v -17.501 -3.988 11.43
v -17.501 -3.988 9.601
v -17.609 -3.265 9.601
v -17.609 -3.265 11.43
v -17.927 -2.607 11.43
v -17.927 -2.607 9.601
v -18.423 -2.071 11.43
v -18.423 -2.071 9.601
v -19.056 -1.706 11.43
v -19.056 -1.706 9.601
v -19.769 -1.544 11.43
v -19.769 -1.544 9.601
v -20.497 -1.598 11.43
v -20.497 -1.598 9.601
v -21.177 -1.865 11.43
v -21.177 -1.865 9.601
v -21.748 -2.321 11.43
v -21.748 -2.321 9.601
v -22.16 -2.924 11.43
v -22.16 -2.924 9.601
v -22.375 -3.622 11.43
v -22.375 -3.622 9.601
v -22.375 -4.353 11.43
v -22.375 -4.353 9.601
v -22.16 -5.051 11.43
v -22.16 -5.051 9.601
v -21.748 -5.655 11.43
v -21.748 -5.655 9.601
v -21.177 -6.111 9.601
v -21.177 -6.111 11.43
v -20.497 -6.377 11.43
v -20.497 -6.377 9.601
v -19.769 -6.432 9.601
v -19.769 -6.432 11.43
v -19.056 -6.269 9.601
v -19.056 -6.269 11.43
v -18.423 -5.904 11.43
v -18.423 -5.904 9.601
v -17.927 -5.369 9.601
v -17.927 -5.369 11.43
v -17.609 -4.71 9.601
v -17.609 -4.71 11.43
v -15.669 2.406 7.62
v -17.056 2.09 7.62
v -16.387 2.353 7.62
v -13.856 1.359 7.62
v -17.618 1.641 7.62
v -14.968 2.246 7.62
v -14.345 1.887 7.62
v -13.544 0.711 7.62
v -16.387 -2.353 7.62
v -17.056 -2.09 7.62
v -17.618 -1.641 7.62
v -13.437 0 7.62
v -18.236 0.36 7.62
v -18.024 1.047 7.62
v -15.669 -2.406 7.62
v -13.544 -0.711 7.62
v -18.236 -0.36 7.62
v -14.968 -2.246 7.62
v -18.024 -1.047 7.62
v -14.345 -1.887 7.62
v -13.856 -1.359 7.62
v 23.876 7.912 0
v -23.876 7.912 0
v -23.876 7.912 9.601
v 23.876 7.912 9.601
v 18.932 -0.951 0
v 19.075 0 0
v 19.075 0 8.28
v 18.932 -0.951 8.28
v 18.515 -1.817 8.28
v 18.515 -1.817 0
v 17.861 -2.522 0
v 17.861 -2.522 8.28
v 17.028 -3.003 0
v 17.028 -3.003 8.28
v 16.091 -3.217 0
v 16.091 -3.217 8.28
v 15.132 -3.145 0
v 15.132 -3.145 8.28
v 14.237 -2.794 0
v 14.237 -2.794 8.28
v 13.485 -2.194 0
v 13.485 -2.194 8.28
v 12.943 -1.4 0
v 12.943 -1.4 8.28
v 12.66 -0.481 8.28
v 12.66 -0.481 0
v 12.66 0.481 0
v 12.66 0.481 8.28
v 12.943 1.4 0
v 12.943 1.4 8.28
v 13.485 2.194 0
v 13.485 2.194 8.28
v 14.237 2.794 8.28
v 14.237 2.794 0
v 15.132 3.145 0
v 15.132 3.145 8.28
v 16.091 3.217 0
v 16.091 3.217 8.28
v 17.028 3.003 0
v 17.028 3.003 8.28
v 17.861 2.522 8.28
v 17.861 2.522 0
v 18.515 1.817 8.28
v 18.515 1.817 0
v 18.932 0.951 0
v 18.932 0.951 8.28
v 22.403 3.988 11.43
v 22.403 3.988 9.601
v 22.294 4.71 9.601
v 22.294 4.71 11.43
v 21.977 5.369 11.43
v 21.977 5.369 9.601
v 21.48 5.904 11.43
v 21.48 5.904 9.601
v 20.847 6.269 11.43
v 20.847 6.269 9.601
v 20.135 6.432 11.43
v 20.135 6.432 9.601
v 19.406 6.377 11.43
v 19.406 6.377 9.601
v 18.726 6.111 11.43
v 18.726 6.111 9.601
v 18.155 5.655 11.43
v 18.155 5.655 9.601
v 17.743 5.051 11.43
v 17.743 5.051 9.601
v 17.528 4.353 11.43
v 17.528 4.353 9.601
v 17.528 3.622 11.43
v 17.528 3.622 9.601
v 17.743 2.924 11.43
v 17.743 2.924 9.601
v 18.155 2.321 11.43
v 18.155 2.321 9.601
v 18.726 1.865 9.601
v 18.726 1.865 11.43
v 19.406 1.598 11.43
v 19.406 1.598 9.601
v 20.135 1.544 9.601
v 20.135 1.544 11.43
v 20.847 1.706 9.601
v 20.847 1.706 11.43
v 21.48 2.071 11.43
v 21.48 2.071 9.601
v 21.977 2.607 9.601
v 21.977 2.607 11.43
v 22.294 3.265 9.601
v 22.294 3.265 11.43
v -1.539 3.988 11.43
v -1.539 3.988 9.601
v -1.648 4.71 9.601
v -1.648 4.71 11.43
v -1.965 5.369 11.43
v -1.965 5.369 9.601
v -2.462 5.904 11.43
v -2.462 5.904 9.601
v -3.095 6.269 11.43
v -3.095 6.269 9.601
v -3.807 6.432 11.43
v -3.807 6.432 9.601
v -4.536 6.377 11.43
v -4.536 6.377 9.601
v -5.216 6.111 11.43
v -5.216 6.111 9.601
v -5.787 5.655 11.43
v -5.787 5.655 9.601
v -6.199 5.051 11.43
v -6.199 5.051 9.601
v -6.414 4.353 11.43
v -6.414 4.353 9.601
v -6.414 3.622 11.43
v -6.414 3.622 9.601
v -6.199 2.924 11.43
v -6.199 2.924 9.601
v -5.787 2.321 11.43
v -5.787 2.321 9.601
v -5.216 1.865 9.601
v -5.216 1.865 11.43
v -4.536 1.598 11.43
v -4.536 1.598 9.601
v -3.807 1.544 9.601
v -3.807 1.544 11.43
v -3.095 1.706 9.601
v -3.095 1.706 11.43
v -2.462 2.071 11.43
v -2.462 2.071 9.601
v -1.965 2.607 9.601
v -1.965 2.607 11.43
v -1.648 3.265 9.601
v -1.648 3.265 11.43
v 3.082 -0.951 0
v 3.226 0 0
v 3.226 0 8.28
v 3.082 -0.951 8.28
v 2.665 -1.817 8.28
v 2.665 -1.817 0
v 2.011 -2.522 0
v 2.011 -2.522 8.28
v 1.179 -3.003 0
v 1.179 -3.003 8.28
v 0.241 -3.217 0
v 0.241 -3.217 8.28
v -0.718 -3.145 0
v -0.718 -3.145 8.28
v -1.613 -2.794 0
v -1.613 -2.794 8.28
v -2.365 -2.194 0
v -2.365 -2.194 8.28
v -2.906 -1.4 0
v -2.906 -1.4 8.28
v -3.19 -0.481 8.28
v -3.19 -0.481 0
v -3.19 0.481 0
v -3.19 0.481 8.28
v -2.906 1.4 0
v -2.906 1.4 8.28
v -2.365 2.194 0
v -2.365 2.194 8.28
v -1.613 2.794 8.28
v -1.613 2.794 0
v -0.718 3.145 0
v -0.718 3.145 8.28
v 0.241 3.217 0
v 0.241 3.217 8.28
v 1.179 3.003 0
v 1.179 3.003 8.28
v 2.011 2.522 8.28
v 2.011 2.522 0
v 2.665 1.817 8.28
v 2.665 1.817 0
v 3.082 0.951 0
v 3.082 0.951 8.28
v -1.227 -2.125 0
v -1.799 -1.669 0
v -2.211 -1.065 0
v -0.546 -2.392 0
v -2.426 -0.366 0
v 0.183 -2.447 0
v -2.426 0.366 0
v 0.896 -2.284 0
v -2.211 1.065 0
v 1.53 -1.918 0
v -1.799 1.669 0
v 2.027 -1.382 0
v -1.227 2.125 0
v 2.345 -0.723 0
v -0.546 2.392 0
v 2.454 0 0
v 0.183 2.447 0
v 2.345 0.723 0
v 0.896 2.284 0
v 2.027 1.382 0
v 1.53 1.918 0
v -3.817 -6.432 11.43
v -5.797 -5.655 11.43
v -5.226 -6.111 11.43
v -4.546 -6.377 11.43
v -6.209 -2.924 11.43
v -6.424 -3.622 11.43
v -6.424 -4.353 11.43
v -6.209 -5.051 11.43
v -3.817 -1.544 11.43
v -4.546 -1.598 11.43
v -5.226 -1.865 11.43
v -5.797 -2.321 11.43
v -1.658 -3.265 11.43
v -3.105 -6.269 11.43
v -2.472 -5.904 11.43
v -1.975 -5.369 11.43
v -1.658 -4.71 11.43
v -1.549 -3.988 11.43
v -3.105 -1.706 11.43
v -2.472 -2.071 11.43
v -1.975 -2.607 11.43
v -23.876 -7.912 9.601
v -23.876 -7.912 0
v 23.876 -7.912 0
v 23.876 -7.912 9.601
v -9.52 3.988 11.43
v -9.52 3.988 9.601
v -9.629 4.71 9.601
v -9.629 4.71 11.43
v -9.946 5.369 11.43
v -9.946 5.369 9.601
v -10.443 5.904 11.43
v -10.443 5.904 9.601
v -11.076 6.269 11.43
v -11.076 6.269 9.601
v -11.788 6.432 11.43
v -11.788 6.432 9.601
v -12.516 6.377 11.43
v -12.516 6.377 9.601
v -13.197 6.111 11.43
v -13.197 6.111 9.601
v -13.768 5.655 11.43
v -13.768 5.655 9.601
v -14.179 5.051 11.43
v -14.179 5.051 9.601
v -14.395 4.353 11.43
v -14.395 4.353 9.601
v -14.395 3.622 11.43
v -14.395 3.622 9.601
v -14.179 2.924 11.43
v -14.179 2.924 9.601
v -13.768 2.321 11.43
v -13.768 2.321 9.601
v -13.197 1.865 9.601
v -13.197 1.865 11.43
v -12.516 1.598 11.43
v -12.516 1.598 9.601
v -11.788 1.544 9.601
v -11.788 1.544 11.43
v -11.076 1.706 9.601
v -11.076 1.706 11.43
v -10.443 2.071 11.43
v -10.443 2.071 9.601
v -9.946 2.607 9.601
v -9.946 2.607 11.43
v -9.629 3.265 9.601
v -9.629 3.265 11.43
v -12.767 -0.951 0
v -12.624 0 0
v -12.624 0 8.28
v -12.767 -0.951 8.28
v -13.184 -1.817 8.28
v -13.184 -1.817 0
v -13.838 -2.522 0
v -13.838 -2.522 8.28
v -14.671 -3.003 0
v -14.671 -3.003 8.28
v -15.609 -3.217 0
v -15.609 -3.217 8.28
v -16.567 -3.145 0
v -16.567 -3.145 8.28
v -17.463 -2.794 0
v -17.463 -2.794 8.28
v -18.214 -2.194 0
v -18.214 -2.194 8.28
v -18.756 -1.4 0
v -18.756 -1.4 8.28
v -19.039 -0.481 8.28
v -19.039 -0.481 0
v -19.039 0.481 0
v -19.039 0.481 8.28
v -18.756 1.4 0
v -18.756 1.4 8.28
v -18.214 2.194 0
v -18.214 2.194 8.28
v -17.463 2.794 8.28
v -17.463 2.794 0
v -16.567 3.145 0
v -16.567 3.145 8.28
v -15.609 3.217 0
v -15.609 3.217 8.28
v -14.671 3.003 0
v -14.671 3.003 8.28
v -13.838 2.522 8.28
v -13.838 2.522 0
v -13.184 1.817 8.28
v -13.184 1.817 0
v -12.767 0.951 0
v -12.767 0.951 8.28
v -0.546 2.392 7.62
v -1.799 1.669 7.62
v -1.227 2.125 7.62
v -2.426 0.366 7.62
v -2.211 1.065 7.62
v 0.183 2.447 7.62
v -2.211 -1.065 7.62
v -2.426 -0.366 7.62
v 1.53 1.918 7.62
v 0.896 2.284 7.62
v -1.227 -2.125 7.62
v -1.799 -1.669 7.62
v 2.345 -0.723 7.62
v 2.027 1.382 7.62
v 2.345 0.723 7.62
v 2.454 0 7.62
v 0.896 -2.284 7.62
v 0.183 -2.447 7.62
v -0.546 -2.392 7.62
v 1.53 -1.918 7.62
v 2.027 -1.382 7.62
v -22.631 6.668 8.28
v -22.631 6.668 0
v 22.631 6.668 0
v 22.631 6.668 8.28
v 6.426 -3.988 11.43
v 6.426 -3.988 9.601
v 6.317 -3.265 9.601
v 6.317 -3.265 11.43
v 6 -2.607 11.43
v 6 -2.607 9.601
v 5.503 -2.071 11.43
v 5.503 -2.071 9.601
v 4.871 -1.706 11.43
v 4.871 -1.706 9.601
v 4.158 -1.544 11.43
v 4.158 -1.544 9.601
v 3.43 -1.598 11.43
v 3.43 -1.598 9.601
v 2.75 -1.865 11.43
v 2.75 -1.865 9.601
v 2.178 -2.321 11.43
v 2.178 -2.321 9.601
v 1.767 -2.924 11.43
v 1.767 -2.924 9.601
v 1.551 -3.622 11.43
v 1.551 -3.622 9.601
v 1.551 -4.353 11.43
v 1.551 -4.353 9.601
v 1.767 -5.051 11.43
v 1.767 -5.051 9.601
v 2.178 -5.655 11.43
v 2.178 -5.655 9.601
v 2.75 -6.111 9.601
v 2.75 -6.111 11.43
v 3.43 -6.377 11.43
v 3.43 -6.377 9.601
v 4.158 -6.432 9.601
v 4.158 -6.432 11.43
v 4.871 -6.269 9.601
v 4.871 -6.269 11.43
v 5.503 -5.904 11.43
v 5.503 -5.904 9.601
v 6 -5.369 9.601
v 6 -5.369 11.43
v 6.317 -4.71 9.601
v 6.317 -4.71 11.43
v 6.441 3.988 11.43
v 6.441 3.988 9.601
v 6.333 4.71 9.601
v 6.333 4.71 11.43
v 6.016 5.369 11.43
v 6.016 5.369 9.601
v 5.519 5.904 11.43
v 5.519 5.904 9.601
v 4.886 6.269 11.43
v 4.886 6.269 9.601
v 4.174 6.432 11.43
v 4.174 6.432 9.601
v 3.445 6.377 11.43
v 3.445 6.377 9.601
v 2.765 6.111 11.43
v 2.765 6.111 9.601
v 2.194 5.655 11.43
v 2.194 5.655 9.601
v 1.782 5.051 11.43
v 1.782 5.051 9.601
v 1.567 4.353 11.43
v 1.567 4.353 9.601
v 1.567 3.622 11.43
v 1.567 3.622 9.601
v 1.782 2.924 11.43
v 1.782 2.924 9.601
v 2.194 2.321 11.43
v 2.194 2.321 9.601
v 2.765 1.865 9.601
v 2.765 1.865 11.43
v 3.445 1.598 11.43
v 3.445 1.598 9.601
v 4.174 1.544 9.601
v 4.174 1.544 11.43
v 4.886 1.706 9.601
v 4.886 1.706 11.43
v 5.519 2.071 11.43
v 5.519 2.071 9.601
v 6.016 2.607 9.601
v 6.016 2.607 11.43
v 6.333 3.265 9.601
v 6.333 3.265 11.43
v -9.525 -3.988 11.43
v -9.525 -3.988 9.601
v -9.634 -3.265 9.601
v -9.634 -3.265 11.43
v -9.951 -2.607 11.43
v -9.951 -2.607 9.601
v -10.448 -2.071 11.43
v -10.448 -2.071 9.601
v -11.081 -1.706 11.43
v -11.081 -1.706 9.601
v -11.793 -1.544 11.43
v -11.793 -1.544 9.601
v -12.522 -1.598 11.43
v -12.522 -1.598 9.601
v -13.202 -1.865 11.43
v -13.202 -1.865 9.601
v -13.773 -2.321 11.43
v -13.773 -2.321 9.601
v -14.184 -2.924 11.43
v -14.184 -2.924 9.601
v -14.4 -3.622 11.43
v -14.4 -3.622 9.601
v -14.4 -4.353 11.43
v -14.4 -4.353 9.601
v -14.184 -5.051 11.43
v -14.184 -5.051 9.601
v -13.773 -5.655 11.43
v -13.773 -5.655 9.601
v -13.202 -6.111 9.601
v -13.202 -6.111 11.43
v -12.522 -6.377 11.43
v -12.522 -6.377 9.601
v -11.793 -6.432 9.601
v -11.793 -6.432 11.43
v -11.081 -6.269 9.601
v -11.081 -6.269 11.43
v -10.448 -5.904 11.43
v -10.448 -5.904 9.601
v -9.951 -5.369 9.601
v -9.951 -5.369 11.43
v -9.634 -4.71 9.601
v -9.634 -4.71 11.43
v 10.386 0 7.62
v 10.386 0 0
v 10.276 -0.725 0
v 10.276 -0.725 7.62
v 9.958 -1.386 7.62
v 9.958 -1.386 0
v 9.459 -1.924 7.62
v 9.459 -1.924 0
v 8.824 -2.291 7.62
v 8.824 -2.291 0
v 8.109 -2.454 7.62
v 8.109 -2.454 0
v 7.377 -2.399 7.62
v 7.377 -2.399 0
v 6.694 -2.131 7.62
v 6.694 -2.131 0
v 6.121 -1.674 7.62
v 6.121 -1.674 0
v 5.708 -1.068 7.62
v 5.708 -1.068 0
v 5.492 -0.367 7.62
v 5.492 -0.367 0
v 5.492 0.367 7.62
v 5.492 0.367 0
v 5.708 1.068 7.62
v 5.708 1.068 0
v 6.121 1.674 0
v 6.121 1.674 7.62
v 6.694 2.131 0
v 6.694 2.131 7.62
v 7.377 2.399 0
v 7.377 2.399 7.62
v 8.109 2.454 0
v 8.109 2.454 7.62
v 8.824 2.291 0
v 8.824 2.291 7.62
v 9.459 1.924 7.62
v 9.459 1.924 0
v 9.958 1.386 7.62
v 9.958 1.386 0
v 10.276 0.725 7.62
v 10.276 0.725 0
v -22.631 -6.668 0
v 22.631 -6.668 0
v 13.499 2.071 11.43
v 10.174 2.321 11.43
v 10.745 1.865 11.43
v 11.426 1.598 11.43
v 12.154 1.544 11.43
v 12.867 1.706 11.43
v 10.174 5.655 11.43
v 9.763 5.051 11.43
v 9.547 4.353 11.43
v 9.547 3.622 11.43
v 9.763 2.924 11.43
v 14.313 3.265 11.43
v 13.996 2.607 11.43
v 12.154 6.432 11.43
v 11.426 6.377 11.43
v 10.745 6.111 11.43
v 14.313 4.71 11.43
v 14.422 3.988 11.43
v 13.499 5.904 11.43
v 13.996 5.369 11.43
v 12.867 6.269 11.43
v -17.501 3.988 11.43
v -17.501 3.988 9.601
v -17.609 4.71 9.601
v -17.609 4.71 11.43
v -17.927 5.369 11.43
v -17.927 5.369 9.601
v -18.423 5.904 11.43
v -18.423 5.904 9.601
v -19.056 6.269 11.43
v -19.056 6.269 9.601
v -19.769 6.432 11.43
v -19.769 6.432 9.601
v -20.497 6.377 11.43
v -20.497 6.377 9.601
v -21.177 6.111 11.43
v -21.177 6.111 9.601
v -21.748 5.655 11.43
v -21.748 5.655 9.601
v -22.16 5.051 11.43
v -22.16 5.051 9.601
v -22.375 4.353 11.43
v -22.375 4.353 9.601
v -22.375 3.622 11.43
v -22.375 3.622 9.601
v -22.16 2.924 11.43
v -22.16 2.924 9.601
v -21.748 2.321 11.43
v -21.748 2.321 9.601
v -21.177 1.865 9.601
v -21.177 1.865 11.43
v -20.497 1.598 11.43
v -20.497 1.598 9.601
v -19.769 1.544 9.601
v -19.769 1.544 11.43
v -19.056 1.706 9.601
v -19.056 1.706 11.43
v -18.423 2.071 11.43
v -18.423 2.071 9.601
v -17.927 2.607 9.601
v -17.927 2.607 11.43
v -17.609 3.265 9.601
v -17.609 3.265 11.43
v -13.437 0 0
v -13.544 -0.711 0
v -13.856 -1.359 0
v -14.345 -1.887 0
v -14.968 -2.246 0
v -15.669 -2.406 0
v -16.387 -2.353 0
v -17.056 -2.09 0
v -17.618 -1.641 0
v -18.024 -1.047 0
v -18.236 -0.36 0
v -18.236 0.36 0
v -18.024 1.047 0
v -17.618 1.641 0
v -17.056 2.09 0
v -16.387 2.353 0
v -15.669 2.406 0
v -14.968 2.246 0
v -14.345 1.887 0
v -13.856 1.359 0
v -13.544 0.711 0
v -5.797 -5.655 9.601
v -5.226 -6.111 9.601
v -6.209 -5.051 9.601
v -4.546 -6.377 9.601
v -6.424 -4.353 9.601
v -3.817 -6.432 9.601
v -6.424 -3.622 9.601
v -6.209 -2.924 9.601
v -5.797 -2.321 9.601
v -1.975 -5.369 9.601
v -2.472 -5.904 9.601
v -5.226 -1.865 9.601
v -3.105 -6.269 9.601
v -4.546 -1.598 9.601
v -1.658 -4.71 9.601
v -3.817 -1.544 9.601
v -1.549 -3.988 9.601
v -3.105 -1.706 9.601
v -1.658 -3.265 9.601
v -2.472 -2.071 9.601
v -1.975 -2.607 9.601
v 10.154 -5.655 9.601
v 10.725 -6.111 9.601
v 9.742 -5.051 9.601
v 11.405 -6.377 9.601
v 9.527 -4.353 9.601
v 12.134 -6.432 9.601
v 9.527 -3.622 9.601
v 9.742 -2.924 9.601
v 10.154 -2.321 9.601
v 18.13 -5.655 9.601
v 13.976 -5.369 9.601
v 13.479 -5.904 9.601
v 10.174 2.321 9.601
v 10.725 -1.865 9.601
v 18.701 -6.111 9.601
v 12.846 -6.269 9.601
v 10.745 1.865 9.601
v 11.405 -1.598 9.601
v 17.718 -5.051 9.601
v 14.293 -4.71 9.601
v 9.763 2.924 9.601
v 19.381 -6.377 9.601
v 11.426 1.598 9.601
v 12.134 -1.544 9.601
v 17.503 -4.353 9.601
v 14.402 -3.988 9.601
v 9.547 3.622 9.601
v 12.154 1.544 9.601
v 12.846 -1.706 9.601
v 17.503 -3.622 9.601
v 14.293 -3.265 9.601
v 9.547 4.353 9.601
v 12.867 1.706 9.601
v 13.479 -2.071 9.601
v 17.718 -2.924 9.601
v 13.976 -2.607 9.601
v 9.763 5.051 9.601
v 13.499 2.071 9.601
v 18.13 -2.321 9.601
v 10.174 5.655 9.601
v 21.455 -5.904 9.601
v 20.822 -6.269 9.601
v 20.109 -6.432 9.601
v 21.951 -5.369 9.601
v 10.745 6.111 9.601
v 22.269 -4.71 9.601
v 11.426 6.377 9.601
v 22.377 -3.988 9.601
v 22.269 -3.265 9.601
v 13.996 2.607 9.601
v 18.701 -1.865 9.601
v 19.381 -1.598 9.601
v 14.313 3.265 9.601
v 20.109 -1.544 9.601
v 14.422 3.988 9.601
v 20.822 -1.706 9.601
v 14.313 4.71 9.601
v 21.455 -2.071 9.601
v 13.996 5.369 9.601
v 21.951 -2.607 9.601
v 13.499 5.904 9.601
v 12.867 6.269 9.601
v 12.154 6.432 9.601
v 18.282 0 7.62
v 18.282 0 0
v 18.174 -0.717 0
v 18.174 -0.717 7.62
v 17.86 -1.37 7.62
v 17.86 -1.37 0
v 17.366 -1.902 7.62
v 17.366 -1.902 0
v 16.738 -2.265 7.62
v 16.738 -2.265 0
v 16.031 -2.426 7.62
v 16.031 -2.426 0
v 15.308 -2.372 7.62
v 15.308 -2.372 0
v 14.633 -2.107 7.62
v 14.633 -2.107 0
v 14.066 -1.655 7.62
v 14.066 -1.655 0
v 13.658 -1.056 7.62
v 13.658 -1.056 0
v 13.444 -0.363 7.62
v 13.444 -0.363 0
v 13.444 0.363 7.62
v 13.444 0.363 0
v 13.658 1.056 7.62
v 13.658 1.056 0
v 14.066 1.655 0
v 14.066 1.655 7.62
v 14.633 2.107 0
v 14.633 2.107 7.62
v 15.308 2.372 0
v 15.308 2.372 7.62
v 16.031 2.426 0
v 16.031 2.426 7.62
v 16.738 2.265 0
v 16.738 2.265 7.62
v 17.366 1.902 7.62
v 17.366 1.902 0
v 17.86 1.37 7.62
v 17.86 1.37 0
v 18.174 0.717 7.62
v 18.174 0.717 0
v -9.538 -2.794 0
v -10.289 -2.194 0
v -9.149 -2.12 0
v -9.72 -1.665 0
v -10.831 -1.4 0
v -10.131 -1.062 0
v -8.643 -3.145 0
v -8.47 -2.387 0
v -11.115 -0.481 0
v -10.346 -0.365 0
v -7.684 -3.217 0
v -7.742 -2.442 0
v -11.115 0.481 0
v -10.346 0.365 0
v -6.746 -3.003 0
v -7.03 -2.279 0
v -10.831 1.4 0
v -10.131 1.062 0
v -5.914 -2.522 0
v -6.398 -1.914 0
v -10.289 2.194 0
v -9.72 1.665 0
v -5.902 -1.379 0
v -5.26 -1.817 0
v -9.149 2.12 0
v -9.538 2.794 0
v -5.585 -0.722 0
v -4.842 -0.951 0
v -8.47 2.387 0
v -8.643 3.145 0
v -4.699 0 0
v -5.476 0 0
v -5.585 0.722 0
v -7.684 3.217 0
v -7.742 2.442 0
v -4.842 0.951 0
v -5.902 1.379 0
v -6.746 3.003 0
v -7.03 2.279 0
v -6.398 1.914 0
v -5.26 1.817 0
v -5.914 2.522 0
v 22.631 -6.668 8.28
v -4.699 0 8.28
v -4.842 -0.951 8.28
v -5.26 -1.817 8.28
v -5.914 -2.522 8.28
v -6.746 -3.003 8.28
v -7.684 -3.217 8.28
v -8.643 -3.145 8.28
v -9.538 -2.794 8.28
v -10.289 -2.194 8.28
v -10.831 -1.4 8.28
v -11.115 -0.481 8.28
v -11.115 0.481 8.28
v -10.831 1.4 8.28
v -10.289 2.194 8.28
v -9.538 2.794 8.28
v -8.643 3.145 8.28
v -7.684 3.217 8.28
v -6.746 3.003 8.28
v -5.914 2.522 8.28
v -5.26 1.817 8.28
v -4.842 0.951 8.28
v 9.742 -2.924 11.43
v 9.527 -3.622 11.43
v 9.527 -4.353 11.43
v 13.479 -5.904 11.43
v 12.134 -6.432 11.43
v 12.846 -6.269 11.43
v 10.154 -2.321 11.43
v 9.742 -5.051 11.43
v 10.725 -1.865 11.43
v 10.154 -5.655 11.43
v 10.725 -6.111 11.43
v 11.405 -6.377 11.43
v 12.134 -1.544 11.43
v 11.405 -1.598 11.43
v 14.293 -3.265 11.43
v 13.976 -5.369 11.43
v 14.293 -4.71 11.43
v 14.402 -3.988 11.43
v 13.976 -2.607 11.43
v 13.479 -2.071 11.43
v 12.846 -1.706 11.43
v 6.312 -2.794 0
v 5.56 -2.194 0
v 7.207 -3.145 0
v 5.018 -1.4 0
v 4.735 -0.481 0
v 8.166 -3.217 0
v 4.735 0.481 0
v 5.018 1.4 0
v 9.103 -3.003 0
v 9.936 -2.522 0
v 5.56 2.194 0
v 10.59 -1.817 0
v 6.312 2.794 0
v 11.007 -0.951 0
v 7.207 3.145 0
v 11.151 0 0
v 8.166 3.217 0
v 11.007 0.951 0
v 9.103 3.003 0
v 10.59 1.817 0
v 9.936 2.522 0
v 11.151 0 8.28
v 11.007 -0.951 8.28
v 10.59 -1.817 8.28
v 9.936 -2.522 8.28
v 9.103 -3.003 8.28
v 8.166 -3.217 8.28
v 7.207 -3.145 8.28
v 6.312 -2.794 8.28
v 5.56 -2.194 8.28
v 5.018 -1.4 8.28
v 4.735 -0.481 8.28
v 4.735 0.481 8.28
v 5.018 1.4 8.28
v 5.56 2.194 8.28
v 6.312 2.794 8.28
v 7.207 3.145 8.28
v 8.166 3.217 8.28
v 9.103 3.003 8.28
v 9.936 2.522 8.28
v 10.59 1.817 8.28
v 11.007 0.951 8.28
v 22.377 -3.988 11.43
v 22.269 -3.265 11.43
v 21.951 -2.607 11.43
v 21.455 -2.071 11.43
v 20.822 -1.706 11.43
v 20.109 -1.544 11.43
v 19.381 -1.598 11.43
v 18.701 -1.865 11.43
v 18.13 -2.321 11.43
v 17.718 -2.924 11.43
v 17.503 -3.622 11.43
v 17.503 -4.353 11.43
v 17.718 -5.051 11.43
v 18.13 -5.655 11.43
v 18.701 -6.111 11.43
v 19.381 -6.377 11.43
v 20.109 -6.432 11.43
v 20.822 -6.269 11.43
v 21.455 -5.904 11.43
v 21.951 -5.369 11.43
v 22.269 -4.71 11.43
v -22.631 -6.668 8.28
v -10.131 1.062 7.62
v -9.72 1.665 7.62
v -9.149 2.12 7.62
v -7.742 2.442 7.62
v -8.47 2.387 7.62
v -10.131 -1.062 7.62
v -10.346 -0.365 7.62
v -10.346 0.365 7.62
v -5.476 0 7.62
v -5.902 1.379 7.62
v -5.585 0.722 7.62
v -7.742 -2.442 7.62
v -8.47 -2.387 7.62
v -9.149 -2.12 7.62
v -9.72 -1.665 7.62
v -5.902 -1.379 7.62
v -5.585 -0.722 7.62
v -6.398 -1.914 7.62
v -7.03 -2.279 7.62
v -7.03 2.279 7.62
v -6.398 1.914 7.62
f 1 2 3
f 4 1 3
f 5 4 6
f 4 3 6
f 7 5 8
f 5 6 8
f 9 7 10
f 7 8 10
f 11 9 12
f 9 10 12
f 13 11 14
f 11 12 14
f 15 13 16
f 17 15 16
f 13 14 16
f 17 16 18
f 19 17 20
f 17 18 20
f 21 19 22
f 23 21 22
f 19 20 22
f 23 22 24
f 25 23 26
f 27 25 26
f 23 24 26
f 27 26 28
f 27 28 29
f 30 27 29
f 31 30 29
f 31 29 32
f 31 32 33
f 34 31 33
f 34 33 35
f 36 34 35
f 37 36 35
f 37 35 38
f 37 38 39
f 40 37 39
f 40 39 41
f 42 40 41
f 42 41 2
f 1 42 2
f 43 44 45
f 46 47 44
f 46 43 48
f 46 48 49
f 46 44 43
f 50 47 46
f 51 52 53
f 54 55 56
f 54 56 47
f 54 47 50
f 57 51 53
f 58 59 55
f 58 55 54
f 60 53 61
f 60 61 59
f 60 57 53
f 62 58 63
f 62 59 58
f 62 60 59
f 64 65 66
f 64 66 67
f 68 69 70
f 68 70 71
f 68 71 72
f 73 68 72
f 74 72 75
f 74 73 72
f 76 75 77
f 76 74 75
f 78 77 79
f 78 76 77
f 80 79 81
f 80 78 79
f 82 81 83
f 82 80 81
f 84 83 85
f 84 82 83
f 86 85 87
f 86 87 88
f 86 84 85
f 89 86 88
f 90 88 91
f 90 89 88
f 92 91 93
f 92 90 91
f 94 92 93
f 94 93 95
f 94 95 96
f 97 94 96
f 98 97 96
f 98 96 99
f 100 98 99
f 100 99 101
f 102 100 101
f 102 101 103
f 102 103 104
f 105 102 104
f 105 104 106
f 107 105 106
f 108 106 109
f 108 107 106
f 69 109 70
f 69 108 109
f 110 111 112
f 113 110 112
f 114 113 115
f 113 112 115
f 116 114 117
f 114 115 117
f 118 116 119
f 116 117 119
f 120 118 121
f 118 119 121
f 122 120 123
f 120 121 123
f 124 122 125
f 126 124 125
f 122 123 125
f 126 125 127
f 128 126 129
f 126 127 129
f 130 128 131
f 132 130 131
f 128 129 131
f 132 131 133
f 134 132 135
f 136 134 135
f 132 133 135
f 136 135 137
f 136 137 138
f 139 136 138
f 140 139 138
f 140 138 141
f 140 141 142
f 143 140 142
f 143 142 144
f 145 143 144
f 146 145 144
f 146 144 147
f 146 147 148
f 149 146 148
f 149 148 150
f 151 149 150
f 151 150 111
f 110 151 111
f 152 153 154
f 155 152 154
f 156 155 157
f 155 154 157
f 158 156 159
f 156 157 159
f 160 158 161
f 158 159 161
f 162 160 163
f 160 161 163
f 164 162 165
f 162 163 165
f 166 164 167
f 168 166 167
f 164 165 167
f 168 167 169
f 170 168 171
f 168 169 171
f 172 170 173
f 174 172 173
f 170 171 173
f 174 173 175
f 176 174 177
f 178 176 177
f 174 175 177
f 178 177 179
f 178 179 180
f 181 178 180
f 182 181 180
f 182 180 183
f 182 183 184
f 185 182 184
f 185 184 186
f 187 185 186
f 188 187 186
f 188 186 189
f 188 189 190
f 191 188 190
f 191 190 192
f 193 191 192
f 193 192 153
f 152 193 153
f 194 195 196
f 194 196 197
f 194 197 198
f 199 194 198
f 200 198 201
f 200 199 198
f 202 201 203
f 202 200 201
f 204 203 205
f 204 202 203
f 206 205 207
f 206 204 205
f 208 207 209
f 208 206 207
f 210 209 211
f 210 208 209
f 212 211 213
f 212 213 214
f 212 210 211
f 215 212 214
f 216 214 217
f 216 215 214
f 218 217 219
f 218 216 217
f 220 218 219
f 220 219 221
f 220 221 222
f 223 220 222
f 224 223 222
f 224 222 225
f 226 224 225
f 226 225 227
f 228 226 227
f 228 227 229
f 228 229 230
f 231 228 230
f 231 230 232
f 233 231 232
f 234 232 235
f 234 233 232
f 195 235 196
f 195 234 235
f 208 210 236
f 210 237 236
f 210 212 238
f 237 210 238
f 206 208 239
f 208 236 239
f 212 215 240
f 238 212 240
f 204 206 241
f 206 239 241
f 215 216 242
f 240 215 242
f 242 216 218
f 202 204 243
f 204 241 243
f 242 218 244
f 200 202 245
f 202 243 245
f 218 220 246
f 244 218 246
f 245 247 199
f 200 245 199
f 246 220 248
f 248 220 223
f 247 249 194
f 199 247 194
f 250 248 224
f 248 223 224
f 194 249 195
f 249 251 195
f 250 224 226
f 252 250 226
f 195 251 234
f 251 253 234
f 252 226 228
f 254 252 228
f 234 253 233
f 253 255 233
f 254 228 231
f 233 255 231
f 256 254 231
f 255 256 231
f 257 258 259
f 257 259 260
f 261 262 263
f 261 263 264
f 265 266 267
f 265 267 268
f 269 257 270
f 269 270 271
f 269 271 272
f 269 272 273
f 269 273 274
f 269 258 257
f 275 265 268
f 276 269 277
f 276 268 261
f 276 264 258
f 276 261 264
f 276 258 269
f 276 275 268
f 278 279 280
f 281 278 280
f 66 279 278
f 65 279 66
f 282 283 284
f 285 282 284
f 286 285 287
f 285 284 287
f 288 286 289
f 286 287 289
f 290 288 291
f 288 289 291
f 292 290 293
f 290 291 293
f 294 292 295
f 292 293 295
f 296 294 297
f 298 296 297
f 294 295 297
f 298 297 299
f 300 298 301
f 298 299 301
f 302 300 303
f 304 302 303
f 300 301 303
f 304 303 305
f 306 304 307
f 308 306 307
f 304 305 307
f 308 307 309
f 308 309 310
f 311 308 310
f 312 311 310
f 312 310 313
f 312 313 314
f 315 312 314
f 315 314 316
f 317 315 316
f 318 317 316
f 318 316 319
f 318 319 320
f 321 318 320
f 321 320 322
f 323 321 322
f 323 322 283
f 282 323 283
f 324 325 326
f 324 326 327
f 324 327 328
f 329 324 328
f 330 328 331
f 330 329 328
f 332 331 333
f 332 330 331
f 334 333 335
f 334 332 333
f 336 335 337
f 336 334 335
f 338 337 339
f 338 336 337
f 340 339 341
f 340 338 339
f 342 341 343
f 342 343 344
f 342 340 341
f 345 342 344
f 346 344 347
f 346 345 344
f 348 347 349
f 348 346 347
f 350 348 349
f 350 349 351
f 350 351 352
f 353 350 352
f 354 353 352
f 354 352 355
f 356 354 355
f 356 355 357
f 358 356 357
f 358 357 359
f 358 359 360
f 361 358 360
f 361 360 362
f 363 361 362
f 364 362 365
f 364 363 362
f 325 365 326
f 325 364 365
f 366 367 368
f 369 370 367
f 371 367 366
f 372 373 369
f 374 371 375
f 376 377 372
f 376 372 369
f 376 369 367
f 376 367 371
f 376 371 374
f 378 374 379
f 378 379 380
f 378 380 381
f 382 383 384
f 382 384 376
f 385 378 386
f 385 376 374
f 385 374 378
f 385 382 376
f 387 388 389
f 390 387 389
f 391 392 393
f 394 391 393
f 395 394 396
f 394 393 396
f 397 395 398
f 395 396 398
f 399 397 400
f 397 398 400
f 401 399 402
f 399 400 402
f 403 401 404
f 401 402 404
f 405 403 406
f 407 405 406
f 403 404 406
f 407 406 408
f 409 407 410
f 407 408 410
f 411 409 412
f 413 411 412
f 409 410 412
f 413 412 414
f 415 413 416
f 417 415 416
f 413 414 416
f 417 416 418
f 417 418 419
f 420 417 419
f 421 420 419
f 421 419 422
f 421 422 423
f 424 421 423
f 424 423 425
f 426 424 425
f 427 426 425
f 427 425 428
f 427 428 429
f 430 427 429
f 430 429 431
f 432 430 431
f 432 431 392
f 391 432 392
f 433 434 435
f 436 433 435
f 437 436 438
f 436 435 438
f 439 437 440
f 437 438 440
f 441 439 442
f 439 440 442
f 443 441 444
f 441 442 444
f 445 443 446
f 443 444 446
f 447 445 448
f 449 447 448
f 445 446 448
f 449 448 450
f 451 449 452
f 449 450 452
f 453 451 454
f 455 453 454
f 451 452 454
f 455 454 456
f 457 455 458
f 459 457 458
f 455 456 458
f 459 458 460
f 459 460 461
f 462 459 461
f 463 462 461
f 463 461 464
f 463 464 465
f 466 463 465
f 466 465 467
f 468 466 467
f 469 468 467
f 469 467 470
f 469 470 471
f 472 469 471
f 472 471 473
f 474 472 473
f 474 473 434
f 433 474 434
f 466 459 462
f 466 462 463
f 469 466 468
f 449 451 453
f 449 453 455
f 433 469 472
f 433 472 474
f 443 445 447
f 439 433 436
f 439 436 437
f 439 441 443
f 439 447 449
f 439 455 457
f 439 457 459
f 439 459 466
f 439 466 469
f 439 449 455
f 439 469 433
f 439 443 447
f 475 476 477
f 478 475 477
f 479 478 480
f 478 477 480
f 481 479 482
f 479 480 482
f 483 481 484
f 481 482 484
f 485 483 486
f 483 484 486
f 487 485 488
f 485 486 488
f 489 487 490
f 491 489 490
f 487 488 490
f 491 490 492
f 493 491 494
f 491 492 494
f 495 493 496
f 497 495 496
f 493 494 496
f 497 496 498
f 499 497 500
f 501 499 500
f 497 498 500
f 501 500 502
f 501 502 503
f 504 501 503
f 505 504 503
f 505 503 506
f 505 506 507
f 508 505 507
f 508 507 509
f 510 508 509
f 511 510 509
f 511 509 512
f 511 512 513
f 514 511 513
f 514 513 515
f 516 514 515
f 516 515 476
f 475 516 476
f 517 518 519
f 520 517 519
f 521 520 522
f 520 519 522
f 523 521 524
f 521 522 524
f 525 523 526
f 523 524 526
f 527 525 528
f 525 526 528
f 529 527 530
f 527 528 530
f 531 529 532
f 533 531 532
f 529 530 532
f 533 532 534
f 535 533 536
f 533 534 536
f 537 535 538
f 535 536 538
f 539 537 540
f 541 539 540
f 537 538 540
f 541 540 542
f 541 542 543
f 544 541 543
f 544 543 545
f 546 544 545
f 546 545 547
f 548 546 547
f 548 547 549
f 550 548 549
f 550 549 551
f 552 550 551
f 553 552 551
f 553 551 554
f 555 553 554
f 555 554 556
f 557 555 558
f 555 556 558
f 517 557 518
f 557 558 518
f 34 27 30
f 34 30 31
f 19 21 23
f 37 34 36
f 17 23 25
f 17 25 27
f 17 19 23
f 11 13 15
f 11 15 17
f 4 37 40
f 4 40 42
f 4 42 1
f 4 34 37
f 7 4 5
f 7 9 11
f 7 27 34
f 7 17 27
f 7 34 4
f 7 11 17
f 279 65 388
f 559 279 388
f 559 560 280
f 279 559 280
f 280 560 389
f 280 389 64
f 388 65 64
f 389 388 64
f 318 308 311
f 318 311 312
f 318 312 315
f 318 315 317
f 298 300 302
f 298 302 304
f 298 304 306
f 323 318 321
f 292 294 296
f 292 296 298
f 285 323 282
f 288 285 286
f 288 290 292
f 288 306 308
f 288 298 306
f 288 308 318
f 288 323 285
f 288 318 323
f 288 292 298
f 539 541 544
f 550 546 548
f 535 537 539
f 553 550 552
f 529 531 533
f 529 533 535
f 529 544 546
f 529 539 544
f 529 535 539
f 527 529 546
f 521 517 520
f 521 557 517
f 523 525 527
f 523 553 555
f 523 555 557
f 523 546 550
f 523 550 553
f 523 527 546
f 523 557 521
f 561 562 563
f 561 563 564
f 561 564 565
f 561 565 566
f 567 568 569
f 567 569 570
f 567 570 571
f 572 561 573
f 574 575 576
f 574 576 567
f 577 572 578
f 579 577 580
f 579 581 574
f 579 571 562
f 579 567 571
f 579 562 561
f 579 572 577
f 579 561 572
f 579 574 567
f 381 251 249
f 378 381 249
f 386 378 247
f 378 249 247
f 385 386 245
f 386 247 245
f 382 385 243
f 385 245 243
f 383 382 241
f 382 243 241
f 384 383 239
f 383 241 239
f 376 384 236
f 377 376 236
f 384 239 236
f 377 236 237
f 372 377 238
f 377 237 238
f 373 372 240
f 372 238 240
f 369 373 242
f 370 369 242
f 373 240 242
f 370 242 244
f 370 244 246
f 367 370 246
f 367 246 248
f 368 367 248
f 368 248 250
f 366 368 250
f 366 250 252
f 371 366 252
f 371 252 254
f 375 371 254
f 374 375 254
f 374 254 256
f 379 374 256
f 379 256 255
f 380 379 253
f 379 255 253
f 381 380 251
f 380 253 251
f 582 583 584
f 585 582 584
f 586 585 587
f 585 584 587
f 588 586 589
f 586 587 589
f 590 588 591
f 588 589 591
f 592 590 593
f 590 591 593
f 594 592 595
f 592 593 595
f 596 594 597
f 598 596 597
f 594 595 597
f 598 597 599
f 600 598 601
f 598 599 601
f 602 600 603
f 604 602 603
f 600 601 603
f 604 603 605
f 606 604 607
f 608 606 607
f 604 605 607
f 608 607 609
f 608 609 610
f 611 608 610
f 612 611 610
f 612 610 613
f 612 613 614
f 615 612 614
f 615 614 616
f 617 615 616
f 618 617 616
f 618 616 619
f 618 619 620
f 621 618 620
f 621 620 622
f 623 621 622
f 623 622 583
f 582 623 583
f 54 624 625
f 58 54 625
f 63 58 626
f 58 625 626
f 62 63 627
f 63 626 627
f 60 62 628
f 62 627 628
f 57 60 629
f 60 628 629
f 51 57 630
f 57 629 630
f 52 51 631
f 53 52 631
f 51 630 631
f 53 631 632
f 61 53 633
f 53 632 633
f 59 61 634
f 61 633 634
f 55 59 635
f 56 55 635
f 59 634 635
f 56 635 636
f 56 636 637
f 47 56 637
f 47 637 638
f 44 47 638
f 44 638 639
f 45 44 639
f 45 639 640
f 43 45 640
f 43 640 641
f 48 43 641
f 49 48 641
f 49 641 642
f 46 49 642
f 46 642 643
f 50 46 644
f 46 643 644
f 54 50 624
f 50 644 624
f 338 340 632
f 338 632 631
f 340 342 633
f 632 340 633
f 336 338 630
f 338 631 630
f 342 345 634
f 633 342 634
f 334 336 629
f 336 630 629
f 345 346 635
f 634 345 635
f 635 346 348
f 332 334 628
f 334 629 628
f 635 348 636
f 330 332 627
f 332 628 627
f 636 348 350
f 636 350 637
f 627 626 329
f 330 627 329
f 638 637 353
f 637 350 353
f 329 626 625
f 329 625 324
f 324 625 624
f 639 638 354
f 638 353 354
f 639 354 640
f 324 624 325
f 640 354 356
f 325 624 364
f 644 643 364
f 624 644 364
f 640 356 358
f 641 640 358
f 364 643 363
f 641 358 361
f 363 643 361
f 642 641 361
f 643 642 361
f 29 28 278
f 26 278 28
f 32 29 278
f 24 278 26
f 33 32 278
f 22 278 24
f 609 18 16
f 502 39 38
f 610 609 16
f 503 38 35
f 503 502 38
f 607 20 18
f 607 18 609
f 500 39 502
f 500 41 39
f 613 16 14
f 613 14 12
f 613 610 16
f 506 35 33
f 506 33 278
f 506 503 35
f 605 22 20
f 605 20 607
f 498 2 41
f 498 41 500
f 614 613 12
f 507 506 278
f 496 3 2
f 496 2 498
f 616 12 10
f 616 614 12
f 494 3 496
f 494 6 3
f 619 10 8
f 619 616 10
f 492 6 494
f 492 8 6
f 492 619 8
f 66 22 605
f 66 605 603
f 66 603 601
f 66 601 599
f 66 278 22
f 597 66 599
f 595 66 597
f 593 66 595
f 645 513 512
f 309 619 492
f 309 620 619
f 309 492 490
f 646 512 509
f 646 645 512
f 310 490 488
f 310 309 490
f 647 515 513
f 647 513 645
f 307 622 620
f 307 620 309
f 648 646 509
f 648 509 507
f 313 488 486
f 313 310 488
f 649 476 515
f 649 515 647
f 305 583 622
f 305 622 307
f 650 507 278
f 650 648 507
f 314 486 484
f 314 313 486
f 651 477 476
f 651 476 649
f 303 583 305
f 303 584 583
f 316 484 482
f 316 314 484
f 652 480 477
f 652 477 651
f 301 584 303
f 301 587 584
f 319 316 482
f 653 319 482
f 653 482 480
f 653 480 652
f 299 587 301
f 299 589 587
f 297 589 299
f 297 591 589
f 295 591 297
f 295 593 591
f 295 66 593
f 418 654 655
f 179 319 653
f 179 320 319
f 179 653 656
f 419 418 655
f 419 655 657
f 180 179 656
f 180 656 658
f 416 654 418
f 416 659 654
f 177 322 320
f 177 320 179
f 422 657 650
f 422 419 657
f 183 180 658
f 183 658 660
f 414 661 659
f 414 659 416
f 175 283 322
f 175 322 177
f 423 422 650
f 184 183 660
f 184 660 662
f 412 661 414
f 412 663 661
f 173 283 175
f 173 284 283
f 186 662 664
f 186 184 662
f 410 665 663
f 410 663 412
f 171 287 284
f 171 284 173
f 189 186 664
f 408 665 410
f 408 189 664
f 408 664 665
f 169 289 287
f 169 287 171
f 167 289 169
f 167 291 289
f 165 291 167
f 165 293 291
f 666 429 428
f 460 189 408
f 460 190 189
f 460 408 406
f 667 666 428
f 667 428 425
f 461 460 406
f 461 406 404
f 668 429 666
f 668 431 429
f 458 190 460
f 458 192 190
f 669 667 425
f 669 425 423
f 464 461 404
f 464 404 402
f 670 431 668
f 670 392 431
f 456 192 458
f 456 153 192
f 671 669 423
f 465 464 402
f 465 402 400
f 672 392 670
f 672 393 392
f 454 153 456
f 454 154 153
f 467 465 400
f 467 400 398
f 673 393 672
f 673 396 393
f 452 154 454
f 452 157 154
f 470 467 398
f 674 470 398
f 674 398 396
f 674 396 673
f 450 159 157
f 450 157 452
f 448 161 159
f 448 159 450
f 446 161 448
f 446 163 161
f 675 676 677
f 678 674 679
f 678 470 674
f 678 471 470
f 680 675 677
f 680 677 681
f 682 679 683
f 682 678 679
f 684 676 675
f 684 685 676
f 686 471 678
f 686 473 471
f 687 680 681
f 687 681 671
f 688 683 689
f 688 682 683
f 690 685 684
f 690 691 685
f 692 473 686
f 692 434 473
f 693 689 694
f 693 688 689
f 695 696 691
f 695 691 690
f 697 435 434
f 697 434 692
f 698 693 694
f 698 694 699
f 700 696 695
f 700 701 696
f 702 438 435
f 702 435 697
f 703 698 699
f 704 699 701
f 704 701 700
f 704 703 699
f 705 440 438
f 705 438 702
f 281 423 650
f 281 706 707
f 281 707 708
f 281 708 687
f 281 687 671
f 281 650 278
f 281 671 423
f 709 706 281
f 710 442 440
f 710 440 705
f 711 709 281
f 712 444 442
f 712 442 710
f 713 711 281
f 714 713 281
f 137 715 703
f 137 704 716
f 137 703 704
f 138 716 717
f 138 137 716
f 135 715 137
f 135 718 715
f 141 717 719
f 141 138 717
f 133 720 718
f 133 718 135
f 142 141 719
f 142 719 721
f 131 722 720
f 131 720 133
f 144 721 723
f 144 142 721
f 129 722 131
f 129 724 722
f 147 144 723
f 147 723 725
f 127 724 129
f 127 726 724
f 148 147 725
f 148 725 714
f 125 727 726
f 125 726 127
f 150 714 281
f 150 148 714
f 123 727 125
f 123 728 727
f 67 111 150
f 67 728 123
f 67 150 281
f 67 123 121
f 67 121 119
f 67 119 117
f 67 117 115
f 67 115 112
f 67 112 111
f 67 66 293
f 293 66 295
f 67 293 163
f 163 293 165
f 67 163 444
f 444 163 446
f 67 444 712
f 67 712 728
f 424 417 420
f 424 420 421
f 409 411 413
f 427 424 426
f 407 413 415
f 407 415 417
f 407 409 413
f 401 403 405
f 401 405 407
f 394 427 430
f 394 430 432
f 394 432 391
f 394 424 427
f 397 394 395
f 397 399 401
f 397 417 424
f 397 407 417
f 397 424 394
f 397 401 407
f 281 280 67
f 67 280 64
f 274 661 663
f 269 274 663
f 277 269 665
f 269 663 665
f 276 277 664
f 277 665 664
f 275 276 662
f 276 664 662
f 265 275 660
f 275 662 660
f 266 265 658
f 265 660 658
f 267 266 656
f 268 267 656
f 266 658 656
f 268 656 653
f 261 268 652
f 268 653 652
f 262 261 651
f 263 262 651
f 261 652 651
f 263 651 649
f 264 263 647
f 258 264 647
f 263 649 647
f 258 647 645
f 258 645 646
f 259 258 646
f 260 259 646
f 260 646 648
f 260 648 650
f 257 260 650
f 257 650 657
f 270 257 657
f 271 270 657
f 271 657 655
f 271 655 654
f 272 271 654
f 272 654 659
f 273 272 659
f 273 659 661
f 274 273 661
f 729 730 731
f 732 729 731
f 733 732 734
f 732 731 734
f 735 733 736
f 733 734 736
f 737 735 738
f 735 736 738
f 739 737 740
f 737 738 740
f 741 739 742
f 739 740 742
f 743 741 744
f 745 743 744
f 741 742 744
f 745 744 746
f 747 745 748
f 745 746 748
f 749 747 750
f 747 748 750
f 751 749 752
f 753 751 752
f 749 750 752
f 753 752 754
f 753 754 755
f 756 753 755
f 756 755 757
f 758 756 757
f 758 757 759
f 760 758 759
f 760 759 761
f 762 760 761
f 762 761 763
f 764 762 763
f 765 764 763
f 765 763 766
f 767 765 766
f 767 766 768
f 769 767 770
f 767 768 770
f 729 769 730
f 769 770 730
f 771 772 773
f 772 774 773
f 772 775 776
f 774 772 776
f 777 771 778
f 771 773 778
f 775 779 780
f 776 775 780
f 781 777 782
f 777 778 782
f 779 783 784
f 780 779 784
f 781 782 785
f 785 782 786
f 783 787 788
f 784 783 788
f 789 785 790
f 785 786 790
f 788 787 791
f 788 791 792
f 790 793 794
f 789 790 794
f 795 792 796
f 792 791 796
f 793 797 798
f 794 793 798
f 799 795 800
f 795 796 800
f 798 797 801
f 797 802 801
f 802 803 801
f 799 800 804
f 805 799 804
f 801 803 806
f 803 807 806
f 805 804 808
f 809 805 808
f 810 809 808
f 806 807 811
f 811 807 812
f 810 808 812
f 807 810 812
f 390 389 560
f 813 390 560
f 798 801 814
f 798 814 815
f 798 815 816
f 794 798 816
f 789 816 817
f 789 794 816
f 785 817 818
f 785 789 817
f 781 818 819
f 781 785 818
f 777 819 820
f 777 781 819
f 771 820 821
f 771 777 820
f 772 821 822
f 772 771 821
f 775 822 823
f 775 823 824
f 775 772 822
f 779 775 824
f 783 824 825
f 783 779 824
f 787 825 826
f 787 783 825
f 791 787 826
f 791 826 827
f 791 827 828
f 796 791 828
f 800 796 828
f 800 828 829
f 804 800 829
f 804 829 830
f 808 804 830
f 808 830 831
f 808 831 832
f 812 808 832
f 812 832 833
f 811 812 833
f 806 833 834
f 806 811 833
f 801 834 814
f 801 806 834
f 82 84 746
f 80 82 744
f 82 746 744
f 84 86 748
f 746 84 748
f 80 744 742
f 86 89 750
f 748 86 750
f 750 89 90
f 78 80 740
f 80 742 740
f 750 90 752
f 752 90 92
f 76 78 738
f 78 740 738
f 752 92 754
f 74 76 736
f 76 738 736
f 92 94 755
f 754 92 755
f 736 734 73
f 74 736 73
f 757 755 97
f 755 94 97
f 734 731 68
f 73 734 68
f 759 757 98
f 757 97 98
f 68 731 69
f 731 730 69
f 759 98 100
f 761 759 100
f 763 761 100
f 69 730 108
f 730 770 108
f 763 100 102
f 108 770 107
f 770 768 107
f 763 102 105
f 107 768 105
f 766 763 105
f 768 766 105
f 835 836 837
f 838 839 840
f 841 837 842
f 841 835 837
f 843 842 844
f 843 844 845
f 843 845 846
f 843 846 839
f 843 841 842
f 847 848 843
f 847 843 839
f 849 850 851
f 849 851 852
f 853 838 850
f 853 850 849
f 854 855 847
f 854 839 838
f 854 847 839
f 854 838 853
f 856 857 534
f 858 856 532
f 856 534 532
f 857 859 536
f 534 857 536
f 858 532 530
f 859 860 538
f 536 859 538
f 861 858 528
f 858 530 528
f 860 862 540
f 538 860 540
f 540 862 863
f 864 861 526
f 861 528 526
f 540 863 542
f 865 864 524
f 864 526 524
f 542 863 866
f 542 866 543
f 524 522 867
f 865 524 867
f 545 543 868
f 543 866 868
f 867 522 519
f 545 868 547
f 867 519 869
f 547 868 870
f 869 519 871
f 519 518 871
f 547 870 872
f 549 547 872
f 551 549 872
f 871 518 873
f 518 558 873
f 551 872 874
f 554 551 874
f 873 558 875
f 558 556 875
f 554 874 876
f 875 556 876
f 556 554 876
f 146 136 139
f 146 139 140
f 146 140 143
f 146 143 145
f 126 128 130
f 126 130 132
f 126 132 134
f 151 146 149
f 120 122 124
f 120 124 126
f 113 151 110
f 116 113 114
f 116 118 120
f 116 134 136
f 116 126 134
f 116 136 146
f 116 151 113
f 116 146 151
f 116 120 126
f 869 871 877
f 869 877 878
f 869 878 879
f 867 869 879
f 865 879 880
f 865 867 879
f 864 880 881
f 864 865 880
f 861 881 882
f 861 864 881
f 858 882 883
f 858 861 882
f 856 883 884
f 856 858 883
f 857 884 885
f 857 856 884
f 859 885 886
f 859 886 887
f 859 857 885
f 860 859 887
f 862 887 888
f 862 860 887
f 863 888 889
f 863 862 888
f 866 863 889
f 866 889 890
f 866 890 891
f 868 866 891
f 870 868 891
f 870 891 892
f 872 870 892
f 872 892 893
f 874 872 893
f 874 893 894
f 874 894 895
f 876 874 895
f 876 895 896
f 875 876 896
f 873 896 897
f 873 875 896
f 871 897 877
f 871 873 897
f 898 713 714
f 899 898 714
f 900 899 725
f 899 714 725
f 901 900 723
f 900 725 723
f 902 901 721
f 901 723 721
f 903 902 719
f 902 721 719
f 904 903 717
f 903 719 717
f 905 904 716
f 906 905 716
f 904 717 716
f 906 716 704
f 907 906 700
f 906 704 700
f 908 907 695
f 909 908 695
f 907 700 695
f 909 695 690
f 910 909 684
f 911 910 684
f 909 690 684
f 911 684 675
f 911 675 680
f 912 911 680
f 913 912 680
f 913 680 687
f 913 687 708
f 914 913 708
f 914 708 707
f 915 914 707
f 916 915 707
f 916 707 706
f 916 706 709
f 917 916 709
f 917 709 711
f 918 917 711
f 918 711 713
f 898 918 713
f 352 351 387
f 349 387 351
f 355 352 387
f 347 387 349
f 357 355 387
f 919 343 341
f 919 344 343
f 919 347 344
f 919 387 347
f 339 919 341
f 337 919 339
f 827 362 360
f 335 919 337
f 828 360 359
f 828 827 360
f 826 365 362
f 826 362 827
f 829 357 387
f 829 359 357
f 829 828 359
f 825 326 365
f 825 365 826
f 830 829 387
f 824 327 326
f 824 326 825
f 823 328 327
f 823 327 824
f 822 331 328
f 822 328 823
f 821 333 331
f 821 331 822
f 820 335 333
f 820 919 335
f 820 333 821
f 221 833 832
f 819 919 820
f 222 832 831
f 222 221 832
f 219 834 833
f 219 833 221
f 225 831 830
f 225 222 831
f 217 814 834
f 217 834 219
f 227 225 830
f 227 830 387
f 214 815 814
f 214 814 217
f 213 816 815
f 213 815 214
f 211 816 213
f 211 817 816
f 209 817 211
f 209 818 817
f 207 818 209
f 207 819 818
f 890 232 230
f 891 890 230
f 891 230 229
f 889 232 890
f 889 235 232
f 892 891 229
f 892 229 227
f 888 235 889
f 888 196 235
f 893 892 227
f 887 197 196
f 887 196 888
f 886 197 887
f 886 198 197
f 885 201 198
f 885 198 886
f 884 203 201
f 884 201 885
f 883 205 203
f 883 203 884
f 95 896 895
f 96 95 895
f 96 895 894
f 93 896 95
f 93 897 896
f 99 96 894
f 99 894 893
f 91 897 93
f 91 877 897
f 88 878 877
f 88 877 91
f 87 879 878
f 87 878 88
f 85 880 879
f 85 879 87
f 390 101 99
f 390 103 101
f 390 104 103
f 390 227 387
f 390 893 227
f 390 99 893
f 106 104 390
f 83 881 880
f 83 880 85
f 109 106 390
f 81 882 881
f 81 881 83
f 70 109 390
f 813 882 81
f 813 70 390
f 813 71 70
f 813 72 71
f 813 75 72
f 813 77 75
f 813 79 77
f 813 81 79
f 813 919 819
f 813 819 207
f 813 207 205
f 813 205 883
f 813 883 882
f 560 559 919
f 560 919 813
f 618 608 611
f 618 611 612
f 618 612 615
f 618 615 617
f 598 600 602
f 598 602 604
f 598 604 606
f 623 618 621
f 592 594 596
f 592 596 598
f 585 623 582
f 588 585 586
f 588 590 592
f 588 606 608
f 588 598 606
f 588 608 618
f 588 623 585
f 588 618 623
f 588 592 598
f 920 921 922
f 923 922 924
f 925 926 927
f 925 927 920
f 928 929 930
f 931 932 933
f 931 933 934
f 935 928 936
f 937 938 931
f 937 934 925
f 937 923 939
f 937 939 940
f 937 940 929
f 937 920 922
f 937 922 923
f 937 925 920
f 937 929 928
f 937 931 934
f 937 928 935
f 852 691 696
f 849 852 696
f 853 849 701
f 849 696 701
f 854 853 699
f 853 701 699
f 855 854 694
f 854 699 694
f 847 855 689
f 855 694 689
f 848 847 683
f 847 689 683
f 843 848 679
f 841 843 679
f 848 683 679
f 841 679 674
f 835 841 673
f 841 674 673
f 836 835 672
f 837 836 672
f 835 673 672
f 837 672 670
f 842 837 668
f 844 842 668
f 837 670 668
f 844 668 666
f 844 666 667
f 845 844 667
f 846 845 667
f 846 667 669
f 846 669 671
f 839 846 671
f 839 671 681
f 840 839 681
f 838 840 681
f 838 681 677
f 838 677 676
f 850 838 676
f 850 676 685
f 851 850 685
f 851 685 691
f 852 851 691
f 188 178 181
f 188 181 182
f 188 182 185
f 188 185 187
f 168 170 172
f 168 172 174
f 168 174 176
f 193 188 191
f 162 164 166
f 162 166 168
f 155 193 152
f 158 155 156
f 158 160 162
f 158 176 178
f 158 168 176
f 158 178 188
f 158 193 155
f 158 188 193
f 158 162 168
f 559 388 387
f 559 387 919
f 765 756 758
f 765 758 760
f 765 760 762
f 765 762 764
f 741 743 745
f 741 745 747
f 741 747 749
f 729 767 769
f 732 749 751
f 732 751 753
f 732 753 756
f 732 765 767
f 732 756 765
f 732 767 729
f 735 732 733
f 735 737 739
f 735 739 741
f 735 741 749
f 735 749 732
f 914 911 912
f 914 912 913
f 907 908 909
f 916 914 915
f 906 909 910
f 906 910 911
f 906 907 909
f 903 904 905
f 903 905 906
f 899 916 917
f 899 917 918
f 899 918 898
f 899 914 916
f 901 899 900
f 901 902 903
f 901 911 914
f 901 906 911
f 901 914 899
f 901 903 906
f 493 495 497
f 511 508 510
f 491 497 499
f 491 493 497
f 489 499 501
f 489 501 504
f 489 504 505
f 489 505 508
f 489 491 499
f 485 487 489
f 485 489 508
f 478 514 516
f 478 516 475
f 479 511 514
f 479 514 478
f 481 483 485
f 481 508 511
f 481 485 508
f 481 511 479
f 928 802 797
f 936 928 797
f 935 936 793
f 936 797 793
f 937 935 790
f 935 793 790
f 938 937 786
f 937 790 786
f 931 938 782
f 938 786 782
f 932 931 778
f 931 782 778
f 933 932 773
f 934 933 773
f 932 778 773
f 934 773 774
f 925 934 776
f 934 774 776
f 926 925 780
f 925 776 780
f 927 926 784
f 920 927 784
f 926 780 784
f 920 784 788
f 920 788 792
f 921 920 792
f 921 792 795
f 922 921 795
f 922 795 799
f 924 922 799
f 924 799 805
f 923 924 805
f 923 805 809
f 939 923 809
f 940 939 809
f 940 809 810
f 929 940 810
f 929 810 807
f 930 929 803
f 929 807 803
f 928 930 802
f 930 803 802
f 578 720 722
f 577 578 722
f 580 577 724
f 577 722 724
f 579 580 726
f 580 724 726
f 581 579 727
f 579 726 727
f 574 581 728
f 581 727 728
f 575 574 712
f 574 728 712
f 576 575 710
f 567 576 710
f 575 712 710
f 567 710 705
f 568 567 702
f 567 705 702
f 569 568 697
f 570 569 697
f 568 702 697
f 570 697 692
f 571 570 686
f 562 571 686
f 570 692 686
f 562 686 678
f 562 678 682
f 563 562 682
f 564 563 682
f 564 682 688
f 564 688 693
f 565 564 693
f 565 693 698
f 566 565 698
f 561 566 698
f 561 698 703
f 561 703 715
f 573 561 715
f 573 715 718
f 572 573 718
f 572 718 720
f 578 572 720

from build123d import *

# Parameters (mm, degrees)
F0_W      = 47.752
F0_H      = 15.8242
F0_R      = 2.4511
F1_DEPTH  = 9.6012
F2_DEPTH  = 11.43
F3_W      = 45.2628
F3_H      = 13.335
F3_R      = 3.2258
F4_DEPTH  = 7.62
F5_DEPTH  = 8.2804
F6_R      = 2.413
F7_DEPTH  = 7.62
F8_R      = 2.448528
F9_DEPTH  = 7.62
F10_R     = 2.453665
F11_DEPTH = 7.62
F12_R     = 2.460778
F13_DEPTH = 7.62
F14_R     = 2.432701
F15_DEPTH = 7.62


with BuildPart() as f1:
    # F0 (on Top) → F1 (new body)
    with BuildSketch(Plane.XY):
        Rectangle(F0_W, F0_H)
        with Locations((-19.9517, -3.9878)):
            Circle(F0_R, mode=Mode.SUBTRACT)
        with Locations((-11.9761, -3.9878)):
            Circle(F0_R, mode=Mode.SUBTRACT)
        with Locations((-4.0005, -3.9878)):
            Circle(F0_R, mode=Mode.SUBTRACT)
        with Locations((3.9751, -3.9878)):
            Circle(F0_R, mode=Mode.SUBTRACT)
        with Locations((11.9507, -3.9878)):
            Circle(F0_R, mode=Mode.SUBTRACT)
        with Locations((19.9263, -3.9878)):
            Circle(F0_R, mode=Mode.SUBTRACT)
        with Locations((-19.9517, 3.9878)):
            Circle(F0_R, mode=Mode.SUBTRACT)
        with Locations((-11.97102, 3.9878)):
            Circle(F0_R, mode=Mode.SUBTRACT)
        with Locations((-3.99034, 3.9878)):
            Circle(F0_R, mode=Mode.SUBTRACT)
        with Locations((3.99034, 3.9878)):
            Circle(F0_R, mode=Mode.SUBTRACT)
        with Locations((11.97102, 3.9878)):
            Circle(F0_R, mode=Mode.SUBTRACT)
        with Locations((19.9517, 3.9878)):
            Circle(F0_R, mode=Mode.SUBTRACT)
        with Locations((-19.9517, 3.9878)):
            Circle(F0_R)
        with Locations((-19.9517, -3.9878)):
            Circle(F0_R)
        with Locations((-11.9761, -3.9878)):
            Circle(F0_R)
        with Locations((-11.97102, 3.9878)):
            Circle(F0_R)
        with Locations((-3.99034, 3.9878)):
            Circle(F0_R)
        with Locations((-4.0005, -3.9878)):
            Circle(F0_R)
        with Locations((3.9751, -3.9878)):
            Circle(F0_R)
        with Locations((3.99034, 3.9878)):
            Circle(F0_R)
        with Locations((11.9507, -3.9878)):
            Circle(F0_R)
        with Locations((11.97102, 3.9878)):
            Circle(F0_R)
        with Locations((19.9263, -3.9878)):
            Circle(F0_R)
        with Locations((19.9517, 3.9878)):
            Circle(F0_R)
    extrude(amount=F1_DEPTH)

    # F0 (on Top) → F2 (join)
    with BuildSketch(Plane.XY):
        with Locations((-11.9761, -3.9878)):
            Circle(F0_R)
        with Locations((-19.9517, -3.9878)):
            Circle(F0_R)
        with Locations((-4.0005, -3.9878)):
            Circle(F0_R)
        with Locations((3.9751, -3.9878)):
            Circle(F0_R)
        with Locations((11.9507, -3.9878)):
            Circle(F0_R)
        with Locations((19.9263, -3.9878)):
            Circle(F0_R)
        with Locations((3.99034, 3.9878)):
            Circle(F0_R)
        with Locations((11.97102, 3.9878)):
            Circle(F0_R)
        with Locations((19.9517, 3.9878)):
            Circle(F0_R)
        with Locations((-3.99034, 3.9878)):
            Circle(F0_R)
        with Locations((-11.97102, 3.9878)):
            Circle(F0_R)
        with Locations((-19.9517, 3.9878)):
            Circle(F0_R)
    extrude(amount=F2_DEPTH)

    # F3 (on face) → F4 (join)
    with BuildSketch(Plane(origin=(0, 0, 0), x_dir=(1, 0, 0), z_dir=(0, 0, -1))):
        Rectangle(F3_W, F3_H)
        with Locations((-15.8496, 0)):
            Circle(F3_R, mode=Mode.SUBTRACT)
        with Locations((-7.9248, 0)):
            Circle(F3_R, mode=Mode.SUBTRACT)
        Circle(F3_R, mode=Mode.SUBTRACT)
        with Locations((7.9248, 0)):
            Circle(F3_R, mode=Mode.SUBTRACT)
        with Locations((15.8496, 0)):
            Circle(F3_R, mode=Mode.SUBTRACT)
    extrude(amount=-F4_DEPTH)

    # F3 (on face) → F5 (cut)
    with BuildSketch(Plane(origin=(0, 0, 0), x_dir=(1, 0, 0), z_dir=(0, 0, -1))):
        Rectangle(F3_W, F3_H)
        with Locations((-15.8496, 0)):
            Circle(F3_R, mode=Mode.SUBTRACT)
        with Locations((-7.9248, 0)):
            Circle(F3_R, mode=Mode.SUBTRACT)
        Circle(F3_R, mode=Mode.SUBTRACT)
        with Locations((7.9248, 0)):
            Circle(F3_R, mode=Mode.SUBTRACT)
        with Locations((15.8496, 0)):
            Circle(F3_R, mode=Mode.SUBTRACT)
    extrude(amount=-F5_DEPTH, mode=Mode.SUBTRACT)

    # F6 (on face) → F7 (cut)
    with BuildSketch(Plane(origin=(0, 0, 0), x_dir=(1, 0, 0), z_dir=(0, 0, -1))):
        with Locations((-15.8496, 0)):
            Circle(F6_R)
    extrude(amount=-F7_DEPTH, mode=Mode.SUBTRACT)

    # F8 (on face) → F9 (cut)
    with BuildSketch(Plane(origin=(0, 0, 0), x_dir=(1, 0, 0), z_dir=(0, 0, -1))):
        with Locations((-7.9248, 0)):
            Circle(F8_R)
    extrude(amount=-F9_DEPTH, mode=Mode.SUBTRACT)

    # F10 (on face) → F11 (cut)
    with BuildSketch(Plane(origin=(0, 0, 0), x_dir=(1, 0, 0), z_dir=(0, 0, -1))):
        Circle(F10_R)
    extrude(amount=-F11_DEPTH, mode=Mode.SUBTRACT)

    # F12 (on face) → F13 (cut)
    with BuildSketch(Plane(origin=(0, 0, 0), x_dir=(1, 0, 0), z_dir=(0, 0, -1))):
        with Locations((7.9248, 0)):
            Circle(F12_R)
    extrude(amount=-F13_DEPTH, mode=Mode.SUBTRACT)

    # F14 (on face) → F15 (cut)
    with BuildSketch(Plane(origin=(0, 0, 0), x_dir=(1, 0, 0), z_dir=(0, 0, -1))):
        with Locations((15.8496, 0)):
            Circle(F14_R)
    extrude(amount=-F15_DEPTH, mode=Mode.SUBTRACT)


solid = f1.part
